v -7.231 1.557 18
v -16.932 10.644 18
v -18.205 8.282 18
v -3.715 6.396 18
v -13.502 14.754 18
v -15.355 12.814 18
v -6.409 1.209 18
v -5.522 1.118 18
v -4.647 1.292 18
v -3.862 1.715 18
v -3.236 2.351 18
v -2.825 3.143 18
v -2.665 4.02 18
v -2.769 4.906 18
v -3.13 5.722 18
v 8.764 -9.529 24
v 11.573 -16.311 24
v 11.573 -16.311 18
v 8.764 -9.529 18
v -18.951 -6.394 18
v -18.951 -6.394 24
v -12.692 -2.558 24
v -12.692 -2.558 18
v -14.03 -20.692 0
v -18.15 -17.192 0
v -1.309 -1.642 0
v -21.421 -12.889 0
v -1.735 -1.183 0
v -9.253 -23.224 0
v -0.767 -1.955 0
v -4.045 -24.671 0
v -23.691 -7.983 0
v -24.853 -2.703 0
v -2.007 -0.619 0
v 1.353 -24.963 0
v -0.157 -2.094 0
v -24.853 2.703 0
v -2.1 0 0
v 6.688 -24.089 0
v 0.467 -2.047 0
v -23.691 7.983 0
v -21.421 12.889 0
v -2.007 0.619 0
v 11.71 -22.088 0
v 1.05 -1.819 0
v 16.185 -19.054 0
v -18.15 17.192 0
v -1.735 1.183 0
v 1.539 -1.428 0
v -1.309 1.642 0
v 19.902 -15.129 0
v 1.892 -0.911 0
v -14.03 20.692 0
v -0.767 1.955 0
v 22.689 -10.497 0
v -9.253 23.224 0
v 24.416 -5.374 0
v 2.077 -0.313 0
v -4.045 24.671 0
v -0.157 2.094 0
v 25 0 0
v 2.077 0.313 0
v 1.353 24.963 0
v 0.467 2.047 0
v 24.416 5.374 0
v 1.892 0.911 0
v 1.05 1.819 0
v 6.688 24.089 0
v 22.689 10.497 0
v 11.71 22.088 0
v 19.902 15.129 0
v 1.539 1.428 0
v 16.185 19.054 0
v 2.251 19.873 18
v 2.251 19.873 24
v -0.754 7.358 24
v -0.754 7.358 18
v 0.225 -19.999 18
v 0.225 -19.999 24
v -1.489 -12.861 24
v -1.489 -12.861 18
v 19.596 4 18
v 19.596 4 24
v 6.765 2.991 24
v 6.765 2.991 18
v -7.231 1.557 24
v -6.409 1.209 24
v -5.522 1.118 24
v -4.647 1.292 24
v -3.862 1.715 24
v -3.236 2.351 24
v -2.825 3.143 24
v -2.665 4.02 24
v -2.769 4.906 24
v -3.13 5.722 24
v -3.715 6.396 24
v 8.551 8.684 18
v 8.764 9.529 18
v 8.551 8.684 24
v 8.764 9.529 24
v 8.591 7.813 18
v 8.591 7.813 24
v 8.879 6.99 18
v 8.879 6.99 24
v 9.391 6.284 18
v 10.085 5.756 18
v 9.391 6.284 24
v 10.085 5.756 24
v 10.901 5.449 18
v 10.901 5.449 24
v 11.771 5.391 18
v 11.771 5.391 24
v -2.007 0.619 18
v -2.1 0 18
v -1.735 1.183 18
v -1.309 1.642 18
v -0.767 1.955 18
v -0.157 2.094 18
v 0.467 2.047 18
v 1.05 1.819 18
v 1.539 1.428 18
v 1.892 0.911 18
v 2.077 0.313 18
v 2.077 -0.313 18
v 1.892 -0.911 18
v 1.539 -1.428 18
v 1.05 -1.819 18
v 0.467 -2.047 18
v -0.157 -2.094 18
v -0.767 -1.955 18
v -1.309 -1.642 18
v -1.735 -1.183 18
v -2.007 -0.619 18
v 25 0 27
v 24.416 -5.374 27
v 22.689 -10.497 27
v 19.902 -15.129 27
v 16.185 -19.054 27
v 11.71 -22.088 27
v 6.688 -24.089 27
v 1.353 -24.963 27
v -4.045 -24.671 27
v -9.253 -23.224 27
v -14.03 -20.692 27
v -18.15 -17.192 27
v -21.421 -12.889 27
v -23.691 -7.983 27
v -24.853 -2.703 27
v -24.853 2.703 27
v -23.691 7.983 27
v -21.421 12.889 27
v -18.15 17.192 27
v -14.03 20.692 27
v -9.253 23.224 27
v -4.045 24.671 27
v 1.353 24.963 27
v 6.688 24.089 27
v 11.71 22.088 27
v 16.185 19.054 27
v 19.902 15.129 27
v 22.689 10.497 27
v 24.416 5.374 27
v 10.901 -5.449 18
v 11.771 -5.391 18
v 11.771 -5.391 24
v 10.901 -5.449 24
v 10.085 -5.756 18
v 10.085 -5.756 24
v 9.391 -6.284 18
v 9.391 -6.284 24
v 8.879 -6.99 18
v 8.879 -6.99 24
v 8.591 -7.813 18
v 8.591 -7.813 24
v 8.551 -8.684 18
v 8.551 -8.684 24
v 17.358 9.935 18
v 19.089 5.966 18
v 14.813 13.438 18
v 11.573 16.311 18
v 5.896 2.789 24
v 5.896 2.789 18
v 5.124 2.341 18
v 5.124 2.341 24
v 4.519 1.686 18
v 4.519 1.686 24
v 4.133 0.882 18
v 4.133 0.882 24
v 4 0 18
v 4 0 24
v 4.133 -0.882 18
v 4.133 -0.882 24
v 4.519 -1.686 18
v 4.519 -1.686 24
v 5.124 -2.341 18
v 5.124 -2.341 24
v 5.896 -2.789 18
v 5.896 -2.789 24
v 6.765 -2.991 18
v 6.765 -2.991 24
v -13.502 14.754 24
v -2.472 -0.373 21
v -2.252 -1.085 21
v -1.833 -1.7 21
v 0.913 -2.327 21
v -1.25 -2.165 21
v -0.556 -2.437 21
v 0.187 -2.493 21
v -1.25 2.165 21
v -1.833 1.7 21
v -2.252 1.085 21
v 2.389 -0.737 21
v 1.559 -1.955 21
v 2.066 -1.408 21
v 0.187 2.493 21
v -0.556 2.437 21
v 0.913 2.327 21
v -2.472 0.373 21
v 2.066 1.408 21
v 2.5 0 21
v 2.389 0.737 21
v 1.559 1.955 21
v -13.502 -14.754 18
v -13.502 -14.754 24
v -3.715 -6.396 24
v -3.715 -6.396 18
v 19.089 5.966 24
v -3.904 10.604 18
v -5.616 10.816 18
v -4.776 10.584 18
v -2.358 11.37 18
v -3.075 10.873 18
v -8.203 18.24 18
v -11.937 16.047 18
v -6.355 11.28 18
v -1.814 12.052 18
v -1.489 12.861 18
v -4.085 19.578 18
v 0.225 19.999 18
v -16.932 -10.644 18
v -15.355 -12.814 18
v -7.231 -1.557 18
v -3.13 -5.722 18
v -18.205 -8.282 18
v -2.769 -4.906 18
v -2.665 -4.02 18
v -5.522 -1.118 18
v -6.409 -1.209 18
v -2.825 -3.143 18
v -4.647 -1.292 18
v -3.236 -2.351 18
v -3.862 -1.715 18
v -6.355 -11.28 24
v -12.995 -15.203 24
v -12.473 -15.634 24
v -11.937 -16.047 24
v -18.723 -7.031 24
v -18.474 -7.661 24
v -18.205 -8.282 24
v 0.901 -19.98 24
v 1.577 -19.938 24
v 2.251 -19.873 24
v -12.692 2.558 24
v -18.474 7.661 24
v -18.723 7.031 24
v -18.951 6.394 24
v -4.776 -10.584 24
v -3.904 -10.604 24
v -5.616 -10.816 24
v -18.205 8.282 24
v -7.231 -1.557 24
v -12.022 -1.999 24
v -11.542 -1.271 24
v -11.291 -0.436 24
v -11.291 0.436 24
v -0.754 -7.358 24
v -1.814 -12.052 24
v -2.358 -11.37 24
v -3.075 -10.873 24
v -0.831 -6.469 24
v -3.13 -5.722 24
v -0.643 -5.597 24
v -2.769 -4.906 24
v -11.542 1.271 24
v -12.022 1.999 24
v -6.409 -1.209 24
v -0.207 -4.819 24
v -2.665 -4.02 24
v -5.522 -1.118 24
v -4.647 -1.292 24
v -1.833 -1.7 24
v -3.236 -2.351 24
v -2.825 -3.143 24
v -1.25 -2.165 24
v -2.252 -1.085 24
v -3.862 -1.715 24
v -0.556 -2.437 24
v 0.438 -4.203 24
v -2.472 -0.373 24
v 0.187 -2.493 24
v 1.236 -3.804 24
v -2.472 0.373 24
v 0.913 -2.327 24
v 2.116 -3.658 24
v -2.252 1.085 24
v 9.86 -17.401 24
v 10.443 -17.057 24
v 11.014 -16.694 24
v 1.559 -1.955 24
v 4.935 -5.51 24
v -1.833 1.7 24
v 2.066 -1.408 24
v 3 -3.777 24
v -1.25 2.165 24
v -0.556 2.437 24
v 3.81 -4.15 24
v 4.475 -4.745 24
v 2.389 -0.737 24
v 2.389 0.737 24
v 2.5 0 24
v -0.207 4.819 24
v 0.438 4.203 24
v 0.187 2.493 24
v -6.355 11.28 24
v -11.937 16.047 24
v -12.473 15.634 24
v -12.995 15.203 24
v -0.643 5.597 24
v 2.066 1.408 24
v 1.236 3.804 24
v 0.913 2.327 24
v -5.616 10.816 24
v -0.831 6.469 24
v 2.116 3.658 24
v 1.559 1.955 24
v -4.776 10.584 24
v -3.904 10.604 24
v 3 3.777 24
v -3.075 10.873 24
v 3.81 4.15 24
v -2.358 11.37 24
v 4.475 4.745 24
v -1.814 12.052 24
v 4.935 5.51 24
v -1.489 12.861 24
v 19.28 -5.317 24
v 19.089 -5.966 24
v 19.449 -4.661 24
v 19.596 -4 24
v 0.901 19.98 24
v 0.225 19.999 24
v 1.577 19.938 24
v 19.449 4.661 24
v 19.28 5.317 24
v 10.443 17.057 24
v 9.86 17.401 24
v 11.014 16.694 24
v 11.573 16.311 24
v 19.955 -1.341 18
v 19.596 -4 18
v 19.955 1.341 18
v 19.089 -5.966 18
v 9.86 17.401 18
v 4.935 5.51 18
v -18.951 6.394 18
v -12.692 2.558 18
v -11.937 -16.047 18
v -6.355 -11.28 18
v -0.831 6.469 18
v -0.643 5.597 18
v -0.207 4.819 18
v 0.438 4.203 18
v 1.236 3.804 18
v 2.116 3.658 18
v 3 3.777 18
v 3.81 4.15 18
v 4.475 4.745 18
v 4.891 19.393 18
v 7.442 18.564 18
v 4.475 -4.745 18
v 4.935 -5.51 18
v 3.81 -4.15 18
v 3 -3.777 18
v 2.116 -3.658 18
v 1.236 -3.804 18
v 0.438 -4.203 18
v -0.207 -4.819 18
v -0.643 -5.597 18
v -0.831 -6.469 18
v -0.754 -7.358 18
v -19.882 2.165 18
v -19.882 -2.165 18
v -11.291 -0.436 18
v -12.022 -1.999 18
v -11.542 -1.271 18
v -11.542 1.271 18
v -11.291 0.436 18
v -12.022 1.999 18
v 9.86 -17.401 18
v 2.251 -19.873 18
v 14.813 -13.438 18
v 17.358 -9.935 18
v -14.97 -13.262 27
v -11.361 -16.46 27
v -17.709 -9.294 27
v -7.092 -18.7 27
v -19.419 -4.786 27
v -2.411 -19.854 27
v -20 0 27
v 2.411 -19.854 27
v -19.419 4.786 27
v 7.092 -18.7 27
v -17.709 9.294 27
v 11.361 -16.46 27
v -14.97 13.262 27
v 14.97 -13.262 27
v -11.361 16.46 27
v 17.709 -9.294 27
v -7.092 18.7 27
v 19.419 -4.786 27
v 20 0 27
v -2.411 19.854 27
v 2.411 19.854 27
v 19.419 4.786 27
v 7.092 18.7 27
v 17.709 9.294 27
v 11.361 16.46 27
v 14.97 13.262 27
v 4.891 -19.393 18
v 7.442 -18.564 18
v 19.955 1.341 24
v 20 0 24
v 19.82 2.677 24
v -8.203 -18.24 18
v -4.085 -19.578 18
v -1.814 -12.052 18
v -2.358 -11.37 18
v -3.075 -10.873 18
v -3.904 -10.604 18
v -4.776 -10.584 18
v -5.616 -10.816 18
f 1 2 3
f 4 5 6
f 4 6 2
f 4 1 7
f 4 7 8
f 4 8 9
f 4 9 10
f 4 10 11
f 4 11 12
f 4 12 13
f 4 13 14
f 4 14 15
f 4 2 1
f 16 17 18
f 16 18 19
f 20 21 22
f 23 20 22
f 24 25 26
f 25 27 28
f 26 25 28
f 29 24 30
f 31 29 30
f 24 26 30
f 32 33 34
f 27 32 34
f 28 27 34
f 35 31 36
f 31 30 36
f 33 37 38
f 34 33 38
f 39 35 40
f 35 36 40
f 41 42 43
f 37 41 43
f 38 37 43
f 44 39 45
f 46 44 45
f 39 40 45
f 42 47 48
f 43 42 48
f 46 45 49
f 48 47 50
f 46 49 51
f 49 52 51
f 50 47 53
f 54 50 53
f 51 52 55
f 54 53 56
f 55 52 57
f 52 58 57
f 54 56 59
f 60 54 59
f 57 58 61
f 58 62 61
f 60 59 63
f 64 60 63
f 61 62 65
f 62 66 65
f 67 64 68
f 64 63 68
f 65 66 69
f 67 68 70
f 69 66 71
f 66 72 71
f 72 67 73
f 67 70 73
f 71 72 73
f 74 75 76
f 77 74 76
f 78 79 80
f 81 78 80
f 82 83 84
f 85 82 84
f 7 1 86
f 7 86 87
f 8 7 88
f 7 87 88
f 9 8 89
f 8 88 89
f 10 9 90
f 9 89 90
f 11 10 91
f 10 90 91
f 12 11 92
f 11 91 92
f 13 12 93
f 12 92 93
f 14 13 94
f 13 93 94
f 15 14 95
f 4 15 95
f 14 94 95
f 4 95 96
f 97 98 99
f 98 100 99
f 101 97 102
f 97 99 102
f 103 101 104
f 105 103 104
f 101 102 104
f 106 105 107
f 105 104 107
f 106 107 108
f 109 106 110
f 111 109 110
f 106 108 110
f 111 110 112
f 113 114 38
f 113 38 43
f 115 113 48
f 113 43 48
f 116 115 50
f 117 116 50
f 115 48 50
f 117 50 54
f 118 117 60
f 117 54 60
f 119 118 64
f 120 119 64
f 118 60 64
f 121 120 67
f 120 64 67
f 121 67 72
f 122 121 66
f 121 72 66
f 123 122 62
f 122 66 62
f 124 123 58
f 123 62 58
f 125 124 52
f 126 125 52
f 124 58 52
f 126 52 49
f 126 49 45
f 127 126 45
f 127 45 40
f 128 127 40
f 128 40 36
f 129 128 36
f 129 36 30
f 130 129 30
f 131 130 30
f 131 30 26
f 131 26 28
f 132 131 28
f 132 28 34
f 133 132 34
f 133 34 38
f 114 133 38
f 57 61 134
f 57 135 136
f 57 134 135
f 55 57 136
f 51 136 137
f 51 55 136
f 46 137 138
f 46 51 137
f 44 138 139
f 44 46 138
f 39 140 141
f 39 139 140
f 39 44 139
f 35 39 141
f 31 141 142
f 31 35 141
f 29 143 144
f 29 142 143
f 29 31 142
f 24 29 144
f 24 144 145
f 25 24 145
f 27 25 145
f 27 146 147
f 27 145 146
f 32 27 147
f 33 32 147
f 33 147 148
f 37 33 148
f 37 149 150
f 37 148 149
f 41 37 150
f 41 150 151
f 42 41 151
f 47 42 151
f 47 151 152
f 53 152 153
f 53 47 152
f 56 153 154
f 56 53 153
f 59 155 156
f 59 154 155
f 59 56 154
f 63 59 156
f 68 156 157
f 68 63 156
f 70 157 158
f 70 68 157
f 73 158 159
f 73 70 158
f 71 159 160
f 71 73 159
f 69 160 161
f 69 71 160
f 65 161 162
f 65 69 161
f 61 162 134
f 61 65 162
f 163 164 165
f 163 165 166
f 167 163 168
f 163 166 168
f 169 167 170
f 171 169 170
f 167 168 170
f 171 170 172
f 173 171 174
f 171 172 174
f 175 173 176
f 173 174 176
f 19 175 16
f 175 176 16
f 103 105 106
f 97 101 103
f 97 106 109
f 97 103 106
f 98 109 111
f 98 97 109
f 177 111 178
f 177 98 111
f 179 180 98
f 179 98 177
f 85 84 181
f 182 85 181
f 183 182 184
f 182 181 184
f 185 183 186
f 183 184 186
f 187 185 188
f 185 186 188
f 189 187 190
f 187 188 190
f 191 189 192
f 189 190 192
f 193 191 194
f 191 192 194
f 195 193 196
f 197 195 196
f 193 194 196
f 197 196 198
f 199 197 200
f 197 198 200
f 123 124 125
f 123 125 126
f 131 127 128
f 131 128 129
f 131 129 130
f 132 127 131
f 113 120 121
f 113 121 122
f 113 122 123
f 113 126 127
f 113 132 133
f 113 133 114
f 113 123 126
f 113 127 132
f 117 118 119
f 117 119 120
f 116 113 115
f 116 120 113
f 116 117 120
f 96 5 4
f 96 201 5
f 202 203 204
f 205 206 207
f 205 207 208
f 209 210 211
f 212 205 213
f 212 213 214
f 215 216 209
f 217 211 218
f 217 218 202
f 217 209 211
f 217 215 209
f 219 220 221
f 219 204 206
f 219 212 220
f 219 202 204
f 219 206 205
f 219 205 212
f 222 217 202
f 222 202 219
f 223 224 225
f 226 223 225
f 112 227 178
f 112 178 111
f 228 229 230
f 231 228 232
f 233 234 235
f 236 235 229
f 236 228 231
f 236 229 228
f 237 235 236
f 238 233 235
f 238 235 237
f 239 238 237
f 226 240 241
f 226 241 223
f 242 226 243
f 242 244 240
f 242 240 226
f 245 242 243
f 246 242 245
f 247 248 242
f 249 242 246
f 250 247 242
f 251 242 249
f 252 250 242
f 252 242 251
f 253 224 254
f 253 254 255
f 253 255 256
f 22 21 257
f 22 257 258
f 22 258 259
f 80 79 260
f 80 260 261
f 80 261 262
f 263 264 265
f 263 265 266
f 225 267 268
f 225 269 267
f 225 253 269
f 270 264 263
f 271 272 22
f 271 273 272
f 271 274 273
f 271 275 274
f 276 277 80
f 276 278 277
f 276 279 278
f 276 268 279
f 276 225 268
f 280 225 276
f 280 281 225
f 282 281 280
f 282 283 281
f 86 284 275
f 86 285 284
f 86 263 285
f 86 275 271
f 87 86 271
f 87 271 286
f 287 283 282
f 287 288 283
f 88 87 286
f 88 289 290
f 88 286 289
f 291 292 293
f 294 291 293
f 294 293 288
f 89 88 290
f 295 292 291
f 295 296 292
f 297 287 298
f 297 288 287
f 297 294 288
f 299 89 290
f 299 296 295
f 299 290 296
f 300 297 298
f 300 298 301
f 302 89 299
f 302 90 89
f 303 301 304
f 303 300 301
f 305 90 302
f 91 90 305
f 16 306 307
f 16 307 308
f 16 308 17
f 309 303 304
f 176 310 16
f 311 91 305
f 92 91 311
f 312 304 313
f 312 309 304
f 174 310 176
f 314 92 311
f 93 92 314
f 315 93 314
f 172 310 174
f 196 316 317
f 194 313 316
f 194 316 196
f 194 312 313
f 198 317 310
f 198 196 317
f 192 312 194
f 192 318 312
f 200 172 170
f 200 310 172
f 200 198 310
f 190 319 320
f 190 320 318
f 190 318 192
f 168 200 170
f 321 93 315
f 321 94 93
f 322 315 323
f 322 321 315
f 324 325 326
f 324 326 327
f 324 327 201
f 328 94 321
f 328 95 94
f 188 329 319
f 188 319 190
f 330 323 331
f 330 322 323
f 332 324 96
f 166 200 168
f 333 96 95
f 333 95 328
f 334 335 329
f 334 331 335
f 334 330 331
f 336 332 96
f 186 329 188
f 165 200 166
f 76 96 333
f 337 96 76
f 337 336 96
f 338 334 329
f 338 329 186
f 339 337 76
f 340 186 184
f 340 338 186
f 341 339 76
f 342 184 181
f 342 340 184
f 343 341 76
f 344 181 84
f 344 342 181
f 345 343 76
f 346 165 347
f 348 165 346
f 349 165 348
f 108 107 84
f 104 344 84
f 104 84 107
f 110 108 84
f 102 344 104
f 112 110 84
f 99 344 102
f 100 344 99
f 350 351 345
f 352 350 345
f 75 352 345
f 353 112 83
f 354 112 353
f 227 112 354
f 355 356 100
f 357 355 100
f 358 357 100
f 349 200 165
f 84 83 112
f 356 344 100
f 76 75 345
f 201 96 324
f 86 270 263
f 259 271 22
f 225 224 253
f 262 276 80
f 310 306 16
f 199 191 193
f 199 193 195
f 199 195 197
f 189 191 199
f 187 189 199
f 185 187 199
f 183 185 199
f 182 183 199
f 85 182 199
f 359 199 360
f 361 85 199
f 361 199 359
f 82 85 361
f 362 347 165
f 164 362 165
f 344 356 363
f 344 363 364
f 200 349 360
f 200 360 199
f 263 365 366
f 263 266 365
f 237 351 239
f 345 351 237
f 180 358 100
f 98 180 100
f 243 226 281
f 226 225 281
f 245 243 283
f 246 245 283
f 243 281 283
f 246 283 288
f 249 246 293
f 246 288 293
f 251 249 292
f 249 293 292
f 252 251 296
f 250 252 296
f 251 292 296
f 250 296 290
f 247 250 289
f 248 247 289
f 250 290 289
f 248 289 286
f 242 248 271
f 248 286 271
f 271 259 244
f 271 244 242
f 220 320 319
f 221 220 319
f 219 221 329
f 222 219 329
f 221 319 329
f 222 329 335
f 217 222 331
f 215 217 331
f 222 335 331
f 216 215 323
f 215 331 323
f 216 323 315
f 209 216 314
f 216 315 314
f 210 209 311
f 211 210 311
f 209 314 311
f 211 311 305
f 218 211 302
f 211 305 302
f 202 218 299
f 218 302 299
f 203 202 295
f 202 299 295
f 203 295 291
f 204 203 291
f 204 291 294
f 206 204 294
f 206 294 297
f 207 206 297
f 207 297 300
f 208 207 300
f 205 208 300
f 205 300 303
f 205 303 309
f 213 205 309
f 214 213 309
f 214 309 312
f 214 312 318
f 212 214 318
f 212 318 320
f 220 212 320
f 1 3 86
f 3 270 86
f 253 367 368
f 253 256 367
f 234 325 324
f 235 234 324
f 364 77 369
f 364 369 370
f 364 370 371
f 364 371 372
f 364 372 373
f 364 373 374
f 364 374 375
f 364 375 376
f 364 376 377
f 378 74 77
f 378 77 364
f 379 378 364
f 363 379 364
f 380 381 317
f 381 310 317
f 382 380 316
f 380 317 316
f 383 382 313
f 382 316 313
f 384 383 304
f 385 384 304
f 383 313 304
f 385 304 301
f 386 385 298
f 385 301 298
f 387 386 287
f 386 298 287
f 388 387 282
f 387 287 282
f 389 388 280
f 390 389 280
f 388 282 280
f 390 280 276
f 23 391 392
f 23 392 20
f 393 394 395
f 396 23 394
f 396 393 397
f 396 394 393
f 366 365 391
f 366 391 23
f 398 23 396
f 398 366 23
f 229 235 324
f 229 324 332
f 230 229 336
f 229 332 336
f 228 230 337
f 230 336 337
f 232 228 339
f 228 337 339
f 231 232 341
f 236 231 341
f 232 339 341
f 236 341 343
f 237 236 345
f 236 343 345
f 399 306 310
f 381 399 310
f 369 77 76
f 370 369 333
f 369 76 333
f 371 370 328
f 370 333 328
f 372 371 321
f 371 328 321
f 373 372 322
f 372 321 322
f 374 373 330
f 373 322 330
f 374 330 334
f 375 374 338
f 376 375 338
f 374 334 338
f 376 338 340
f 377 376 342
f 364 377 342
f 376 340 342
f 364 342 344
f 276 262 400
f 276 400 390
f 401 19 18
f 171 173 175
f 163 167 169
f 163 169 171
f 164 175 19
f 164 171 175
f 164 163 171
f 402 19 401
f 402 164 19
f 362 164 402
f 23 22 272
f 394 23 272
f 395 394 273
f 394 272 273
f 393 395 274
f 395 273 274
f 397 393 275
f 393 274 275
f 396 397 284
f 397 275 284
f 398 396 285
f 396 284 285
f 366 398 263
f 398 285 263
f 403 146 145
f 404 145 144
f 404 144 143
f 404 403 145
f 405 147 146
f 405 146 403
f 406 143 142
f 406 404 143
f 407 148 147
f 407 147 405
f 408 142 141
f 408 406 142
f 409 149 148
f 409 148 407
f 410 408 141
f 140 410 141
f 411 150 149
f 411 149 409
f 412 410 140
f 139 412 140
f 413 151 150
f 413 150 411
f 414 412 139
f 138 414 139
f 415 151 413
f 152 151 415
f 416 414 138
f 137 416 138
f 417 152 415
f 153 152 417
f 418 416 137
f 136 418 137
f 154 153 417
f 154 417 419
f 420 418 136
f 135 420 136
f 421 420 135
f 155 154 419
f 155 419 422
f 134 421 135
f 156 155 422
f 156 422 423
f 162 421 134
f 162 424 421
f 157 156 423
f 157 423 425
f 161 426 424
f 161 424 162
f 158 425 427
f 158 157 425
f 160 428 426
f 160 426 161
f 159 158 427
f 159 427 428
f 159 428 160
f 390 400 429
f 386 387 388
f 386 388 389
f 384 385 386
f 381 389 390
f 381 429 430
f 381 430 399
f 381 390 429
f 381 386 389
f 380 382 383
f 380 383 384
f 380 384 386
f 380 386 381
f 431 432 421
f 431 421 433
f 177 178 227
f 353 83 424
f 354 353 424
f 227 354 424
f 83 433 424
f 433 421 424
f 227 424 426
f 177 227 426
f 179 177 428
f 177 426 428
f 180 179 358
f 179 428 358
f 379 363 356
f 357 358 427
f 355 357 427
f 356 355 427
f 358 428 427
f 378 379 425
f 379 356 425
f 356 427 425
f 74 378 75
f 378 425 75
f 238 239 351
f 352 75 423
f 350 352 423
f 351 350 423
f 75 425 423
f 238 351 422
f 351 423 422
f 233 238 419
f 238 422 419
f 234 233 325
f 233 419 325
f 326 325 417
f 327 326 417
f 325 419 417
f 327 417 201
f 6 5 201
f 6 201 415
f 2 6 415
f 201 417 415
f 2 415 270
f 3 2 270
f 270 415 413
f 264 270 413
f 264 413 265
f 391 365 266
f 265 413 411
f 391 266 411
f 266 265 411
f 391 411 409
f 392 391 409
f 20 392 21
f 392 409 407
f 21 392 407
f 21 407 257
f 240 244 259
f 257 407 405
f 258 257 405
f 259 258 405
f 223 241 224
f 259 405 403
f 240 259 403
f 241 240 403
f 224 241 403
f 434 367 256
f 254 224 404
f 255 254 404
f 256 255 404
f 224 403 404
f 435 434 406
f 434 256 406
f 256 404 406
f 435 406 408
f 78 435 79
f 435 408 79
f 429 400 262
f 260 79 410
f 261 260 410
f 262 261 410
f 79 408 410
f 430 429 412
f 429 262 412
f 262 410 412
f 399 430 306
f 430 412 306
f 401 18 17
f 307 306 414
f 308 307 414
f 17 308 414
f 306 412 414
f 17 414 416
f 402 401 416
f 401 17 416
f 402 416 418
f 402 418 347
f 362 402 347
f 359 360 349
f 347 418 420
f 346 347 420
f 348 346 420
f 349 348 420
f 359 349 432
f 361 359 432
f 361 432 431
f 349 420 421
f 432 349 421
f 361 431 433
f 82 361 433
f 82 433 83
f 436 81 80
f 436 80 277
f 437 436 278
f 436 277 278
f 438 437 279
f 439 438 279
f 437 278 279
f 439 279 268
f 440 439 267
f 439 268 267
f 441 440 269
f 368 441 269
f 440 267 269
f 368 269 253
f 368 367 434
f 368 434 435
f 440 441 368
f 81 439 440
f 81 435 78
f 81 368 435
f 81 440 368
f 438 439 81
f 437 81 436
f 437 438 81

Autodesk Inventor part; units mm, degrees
ref_plane "YZ Plane" through (0, 0, 0) normal (1, 0, 0) x (0, 1, 0)
ref_plane "XZ Plane" through (0, 0, 0) normal (0, 1, 0) x (-1, 0, 0)
ref_plane "XY Plane" through (0, 0, 0) normal (0, 0, 1) x (1, 0, 0)
sketch "草圖1" plane through (0, 0, 0) normal (0, 0, 1) x (1, 0, 0)
  circle A0 centre (0, 0) radius 25
  circle A1 centre (0, 0) radius 2.1
  dimension "d0" = 50
  dimension "d1" = 4.2
extrude "擠出1" add sketch "草圖1" along normal blind 27
sketch "Sketch2" plane through (0, 0, 27) normal (0, 0, 1) x (1, 0, 0)
  circle A0 centre (0, 0) radius 25 projected
  circle A1 centre (0, 0) radius 20
  dimension "d4" = 40
extrude "Extrusion2" cut sketch "Sketch2" against normal blind 3 contours A1
sketch "Sketch4" plane through (0, 0, 24) normal (0, 0, 1) x (1, 0, 0)
  circle A0 centre (0, 0) radius 2.1
extrude "Extrusion3" add sketch "Sketch4" against normal up to surface (24 mm away)
sketch "Sketch5" plane through (0, 0, 24) normal (0, 0, 1) x (1, 0, 0)
  arc A0 (6.7648, 2.9908) -> (6.7648, -2.9908) centre (7, 0) ccw
  circle A1 centre (0, 0) radius 20 projected
  line L0 (19.5959, 4) -> (6.7648, 2.9908)
  line L1 (19.5959, -4) -> (6.7648, -2.9908)
  line L2 (9.8597, 17.4008) -> (4.9348, 5.5095)
  arc A2 (-0.754, 7.3579) -> (4.9348, 5.5095) centre (2.1631, 6.6574) ccw
  line L3 (2.2512, 19.8729) -> (-0.754, 7.3579)
  line L4 (-13.5023, 14.7543) -> (-3.7149, 6.3958)
  arc A3 (-7.2307, 1.5566) -> (-3.7149, 6.3958) centre (-5.6631, 4.1145) ccw
  line L5 (-18.2046, 8.2821) -> (-7.2307, 1.5566)
  line L6 (-18.2046, -8.2821) -> (-7.2307, -1.5566)
  arc A4 (-3.7149, -6.3958) -> (-7.2307, -1.5566) centre (-5.6631, -4.1145) ccw
  line L7 (-13.5023, -14.7543) -> (-3.7149, -6.3958)
  line L8 (2.2512, -19.8729) -> (-0.754, -7.3579)
  arc A5 (4.9348, -5.5095) -> (-0.754, -7.3579) centre (2.1631, -6.6574) ccw
  line L9 (9.8597, -17.4008) -> (4.9348, -5.5095)
  line L10 (11.7075, 16.6355) -> (8.7645, 9.5294)
  line L11 (19.4391, 5.9938) -> (11.7714, 5.3907)
  line L12 (19.0893, -5.9663) -> (19.4391, -5.9938)
  arc A6 (8.7645, 9.5294) -> (11.7714, 5.3907) centre (11.5361, 8.3815) ccw
  circle A7 centre (0, 0) radius 20 projected
  line L13 (0.3065, 20.3399) -> (-1.4893, 12.8611)
  arc A8 (-6.3547, 11.2802) -> (-1.4893, 12.8611) centre (-4.4064, 13.5616) ccw
  line L14 (-12.2035, 16.2751) -> (-6.3547, 11.2802)
  line L15 (-19.2496, 6.5769) -> (-12.6918, 2.5578)
  arc A9 (-12.6918, -2.5578) -> (-12.6918, 2.5578) centre (-14.2595, 0) ccw
  line L16 (-19.2496, -6.5769) -> (-12.6918, -2.5578)
  line L17 (-12.2035, -16.2751) -> (-6.3547, -11.2802)
  arc A10 (-1.4893, -12.8611) -> (-6.3547, -11.2802) centre (-4.4064, -13.5616) ccw
  line L18 (0.3065, -20.3399) -> (-1.4893, -12.8611)
  line L19 (11.7075, -16.6355) -> (8.7645, -9.5294)
  arc A11 (11.7714, -5.3907) -> (8.7645, -9.5294) centre (11.5361, -8.3815) ccw
  line L20 (19.4391, -5.9938) -> (11.7714, -5.3907)
  point P0 (19.0893, 5.9663)
  point P1 (11.5732, 16.3113)
  point P2 (11.5732, -16.3113)
  point P3 (-11.9367, -16.0473)
  point P4 (0.2246, -19.9987)
  point P5 (-18.9505, 6.3936)
  point P6 (-18.9505, -6.3936)
  point P7 (0.2246, 19.9987)
  point P8 (-11.9367, 16.0473)
  dimension "d9" = 6
  dimension "d12" = 360
  dimension "d14" = 2
  dimension "d15" = 2
  dimension "d16" = 3
  dimension "d19" = 360
extrude "Extrusion4" cut sketch "Sketch5" against normal blind 6 contours L0 A1 L1 A0 | L11 A6 L10 A1 | A1 L19 A11 L20 | L2 A2 L3 A1 | A1 L8 A5 L9 | L13 A8 L14 A1 | A1 L17 A10 L18 | L4 A3 L5 A1 | A1 L6 A4 L7 | L15 A9 L16 A1
sketch "Sketch9" plane through (0, 0, 0) normal (0, 0, -1) x (-1, 0, 0)
  circle A0 centre (0, 0) radius 2.1
  dimension "d38" = 4.2
extrude "Extrusion7" cut sketch "Sketch9" against normal blind 18
sketch "Sketch10" plane through (0, 0, 24) normal (0, 0, 1) x (1, 0, 0)
  circle A0 centre (0, 0) radius 2.1 projected
  circle A1 centre (0, 0) radius 2.5
  dimension "d41" = 5
extrude "Extrusion8" cut sketch "Sketch10" against normal blind 3 contours A0 | A1
properties part number "前輪 改"
